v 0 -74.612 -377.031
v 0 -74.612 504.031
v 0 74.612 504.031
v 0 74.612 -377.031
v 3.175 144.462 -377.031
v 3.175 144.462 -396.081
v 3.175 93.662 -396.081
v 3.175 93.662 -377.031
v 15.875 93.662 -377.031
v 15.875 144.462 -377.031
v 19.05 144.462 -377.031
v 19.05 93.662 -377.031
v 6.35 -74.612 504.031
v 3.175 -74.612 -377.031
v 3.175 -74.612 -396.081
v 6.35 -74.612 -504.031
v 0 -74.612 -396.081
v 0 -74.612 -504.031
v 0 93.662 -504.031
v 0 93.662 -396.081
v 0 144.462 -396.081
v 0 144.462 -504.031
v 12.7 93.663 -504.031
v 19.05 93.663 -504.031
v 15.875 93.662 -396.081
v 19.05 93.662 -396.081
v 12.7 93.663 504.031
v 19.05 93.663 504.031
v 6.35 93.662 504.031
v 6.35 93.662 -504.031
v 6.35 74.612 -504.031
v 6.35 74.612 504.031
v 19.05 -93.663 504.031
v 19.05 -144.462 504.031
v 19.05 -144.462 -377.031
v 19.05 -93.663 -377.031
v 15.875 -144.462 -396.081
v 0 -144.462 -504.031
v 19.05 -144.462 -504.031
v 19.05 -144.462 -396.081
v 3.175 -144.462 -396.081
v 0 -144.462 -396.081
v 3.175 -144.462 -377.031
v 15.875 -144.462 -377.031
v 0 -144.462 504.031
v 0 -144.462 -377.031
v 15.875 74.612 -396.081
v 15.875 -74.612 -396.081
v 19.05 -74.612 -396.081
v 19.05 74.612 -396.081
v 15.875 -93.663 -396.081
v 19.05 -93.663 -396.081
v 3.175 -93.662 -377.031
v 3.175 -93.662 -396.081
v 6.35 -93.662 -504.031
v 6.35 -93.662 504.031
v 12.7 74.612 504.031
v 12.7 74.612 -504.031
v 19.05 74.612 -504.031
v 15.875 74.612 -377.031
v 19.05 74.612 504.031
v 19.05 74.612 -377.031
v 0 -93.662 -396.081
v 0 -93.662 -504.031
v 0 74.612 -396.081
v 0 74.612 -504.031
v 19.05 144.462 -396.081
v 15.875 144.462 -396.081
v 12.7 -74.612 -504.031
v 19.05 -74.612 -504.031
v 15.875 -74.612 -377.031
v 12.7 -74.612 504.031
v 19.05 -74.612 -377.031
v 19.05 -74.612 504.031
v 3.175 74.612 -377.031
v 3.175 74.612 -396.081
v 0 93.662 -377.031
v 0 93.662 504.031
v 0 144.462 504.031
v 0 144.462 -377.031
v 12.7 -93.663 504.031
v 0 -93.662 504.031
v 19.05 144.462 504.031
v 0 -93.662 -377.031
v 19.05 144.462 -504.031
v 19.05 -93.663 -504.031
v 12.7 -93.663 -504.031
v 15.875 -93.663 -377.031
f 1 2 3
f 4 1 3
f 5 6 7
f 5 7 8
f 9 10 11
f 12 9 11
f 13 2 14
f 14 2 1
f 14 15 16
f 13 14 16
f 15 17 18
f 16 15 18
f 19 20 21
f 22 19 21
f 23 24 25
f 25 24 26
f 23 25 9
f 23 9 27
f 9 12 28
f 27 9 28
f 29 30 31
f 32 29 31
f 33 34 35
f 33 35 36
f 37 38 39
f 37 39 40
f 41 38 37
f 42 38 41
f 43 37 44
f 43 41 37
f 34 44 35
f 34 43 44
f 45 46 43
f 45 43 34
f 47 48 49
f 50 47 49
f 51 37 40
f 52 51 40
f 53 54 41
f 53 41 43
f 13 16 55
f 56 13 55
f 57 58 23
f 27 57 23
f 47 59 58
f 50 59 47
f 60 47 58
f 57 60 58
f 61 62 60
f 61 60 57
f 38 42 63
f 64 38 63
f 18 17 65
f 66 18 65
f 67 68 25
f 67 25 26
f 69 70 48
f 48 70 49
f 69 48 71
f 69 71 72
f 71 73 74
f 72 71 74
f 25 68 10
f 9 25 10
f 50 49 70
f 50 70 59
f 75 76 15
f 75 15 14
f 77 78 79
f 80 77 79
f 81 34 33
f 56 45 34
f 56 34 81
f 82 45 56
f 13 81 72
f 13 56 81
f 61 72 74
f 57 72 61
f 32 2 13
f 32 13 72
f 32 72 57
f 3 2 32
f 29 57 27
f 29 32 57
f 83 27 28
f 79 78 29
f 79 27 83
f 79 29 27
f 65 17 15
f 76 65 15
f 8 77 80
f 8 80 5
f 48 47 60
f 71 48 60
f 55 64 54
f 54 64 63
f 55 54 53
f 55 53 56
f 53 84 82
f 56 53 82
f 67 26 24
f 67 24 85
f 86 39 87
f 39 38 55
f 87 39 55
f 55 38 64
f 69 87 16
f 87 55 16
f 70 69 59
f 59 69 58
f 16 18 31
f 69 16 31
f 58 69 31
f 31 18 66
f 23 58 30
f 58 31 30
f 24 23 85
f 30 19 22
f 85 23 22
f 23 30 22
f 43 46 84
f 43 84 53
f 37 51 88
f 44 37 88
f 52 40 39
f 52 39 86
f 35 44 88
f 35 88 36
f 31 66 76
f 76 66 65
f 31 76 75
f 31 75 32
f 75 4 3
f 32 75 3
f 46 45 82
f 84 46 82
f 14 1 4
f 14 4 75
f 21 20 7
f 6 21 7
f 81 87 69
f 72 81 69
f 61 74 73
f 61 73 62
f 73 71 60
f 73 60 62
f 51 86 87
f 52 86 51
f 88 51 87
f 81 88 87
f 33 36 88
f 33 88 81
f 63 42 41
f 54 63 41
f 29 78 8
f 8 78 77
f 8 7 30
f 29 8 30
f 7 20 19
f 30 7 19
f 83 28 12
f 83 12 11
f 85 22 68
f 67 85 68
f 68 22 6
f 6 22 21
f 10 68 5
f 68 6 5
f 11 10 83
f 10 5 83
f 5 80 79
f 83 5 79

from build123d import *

# Parameters (mm, degrees)
F0_W     = 288.925
F0_H     = 1008.0625
F1_DEPTH = 19.05
F2_W     = 19.05
F2_H     = 1008.0625
F3_DEPTH = 6.35
F5_DEPTH = 6.35
F6_W     = 3.175
F6_H     = 19.05
F7_DEPTH = 288.926


with BuildPart() as f1:
    # F0 (on Right) → F1 (new body)
    with BuildSketch(Plane.YZ):
        Rectangle(F0_W, F0_H)
    extrude(amount=F1_DEPTH)

    # F2 (on face) → F3 (cut)
    with BuildSketch(Plane.YZ.offset(19.05)):
        with Locations((-84.1375, 0)):
            Rectangle(F2_W, F2_H)
        with Locations((84.1375, 0)):
            Rectangle(F2_W, F2_H)
    extrude(amount=-F3_DEPTH, mode=Mode.SUBTRACT)

    # F4 (on face) → F5 (cut)
    with BuildSketch(Plane(origin=(0, 0, 0), x_dir=(0, -1, 0), z_dir=(-1, 0, 0))):
        Polygon((93.6625, -377.03125), (93.6625, 504.03125), (74.6125, 504.03125), (74.6125, -377.03125), (74.6125, -504.03125), (93.6625, -504.03125), align=None)
        Polygon((-74.6125, 504.03125), (-93.6625, 504.03125), (-93.6625, -377.03125), (-93.6625, -504.03125), (-74.6125, -504.03125), (-74.6125, -377.03125), align=None)
    extrude(amount=-F5_DEPTH, mode=Mode.SUBTRACT)

    # F6 (on face) → F7 (cut, through all)
    with BuildSketch(Plane.XZ.offset(144.4625)):
        with Locations((1.5875, -386.55625)):
            Rectangle(F6_W, F6_H)
        with Locations((17.4625, -386.55625)):
            Rectangle(F6_W, F6_H)
    extrude(amount=-F7_DEPTH, mode=Mode.SUBTRACT)


solid = f1.part
